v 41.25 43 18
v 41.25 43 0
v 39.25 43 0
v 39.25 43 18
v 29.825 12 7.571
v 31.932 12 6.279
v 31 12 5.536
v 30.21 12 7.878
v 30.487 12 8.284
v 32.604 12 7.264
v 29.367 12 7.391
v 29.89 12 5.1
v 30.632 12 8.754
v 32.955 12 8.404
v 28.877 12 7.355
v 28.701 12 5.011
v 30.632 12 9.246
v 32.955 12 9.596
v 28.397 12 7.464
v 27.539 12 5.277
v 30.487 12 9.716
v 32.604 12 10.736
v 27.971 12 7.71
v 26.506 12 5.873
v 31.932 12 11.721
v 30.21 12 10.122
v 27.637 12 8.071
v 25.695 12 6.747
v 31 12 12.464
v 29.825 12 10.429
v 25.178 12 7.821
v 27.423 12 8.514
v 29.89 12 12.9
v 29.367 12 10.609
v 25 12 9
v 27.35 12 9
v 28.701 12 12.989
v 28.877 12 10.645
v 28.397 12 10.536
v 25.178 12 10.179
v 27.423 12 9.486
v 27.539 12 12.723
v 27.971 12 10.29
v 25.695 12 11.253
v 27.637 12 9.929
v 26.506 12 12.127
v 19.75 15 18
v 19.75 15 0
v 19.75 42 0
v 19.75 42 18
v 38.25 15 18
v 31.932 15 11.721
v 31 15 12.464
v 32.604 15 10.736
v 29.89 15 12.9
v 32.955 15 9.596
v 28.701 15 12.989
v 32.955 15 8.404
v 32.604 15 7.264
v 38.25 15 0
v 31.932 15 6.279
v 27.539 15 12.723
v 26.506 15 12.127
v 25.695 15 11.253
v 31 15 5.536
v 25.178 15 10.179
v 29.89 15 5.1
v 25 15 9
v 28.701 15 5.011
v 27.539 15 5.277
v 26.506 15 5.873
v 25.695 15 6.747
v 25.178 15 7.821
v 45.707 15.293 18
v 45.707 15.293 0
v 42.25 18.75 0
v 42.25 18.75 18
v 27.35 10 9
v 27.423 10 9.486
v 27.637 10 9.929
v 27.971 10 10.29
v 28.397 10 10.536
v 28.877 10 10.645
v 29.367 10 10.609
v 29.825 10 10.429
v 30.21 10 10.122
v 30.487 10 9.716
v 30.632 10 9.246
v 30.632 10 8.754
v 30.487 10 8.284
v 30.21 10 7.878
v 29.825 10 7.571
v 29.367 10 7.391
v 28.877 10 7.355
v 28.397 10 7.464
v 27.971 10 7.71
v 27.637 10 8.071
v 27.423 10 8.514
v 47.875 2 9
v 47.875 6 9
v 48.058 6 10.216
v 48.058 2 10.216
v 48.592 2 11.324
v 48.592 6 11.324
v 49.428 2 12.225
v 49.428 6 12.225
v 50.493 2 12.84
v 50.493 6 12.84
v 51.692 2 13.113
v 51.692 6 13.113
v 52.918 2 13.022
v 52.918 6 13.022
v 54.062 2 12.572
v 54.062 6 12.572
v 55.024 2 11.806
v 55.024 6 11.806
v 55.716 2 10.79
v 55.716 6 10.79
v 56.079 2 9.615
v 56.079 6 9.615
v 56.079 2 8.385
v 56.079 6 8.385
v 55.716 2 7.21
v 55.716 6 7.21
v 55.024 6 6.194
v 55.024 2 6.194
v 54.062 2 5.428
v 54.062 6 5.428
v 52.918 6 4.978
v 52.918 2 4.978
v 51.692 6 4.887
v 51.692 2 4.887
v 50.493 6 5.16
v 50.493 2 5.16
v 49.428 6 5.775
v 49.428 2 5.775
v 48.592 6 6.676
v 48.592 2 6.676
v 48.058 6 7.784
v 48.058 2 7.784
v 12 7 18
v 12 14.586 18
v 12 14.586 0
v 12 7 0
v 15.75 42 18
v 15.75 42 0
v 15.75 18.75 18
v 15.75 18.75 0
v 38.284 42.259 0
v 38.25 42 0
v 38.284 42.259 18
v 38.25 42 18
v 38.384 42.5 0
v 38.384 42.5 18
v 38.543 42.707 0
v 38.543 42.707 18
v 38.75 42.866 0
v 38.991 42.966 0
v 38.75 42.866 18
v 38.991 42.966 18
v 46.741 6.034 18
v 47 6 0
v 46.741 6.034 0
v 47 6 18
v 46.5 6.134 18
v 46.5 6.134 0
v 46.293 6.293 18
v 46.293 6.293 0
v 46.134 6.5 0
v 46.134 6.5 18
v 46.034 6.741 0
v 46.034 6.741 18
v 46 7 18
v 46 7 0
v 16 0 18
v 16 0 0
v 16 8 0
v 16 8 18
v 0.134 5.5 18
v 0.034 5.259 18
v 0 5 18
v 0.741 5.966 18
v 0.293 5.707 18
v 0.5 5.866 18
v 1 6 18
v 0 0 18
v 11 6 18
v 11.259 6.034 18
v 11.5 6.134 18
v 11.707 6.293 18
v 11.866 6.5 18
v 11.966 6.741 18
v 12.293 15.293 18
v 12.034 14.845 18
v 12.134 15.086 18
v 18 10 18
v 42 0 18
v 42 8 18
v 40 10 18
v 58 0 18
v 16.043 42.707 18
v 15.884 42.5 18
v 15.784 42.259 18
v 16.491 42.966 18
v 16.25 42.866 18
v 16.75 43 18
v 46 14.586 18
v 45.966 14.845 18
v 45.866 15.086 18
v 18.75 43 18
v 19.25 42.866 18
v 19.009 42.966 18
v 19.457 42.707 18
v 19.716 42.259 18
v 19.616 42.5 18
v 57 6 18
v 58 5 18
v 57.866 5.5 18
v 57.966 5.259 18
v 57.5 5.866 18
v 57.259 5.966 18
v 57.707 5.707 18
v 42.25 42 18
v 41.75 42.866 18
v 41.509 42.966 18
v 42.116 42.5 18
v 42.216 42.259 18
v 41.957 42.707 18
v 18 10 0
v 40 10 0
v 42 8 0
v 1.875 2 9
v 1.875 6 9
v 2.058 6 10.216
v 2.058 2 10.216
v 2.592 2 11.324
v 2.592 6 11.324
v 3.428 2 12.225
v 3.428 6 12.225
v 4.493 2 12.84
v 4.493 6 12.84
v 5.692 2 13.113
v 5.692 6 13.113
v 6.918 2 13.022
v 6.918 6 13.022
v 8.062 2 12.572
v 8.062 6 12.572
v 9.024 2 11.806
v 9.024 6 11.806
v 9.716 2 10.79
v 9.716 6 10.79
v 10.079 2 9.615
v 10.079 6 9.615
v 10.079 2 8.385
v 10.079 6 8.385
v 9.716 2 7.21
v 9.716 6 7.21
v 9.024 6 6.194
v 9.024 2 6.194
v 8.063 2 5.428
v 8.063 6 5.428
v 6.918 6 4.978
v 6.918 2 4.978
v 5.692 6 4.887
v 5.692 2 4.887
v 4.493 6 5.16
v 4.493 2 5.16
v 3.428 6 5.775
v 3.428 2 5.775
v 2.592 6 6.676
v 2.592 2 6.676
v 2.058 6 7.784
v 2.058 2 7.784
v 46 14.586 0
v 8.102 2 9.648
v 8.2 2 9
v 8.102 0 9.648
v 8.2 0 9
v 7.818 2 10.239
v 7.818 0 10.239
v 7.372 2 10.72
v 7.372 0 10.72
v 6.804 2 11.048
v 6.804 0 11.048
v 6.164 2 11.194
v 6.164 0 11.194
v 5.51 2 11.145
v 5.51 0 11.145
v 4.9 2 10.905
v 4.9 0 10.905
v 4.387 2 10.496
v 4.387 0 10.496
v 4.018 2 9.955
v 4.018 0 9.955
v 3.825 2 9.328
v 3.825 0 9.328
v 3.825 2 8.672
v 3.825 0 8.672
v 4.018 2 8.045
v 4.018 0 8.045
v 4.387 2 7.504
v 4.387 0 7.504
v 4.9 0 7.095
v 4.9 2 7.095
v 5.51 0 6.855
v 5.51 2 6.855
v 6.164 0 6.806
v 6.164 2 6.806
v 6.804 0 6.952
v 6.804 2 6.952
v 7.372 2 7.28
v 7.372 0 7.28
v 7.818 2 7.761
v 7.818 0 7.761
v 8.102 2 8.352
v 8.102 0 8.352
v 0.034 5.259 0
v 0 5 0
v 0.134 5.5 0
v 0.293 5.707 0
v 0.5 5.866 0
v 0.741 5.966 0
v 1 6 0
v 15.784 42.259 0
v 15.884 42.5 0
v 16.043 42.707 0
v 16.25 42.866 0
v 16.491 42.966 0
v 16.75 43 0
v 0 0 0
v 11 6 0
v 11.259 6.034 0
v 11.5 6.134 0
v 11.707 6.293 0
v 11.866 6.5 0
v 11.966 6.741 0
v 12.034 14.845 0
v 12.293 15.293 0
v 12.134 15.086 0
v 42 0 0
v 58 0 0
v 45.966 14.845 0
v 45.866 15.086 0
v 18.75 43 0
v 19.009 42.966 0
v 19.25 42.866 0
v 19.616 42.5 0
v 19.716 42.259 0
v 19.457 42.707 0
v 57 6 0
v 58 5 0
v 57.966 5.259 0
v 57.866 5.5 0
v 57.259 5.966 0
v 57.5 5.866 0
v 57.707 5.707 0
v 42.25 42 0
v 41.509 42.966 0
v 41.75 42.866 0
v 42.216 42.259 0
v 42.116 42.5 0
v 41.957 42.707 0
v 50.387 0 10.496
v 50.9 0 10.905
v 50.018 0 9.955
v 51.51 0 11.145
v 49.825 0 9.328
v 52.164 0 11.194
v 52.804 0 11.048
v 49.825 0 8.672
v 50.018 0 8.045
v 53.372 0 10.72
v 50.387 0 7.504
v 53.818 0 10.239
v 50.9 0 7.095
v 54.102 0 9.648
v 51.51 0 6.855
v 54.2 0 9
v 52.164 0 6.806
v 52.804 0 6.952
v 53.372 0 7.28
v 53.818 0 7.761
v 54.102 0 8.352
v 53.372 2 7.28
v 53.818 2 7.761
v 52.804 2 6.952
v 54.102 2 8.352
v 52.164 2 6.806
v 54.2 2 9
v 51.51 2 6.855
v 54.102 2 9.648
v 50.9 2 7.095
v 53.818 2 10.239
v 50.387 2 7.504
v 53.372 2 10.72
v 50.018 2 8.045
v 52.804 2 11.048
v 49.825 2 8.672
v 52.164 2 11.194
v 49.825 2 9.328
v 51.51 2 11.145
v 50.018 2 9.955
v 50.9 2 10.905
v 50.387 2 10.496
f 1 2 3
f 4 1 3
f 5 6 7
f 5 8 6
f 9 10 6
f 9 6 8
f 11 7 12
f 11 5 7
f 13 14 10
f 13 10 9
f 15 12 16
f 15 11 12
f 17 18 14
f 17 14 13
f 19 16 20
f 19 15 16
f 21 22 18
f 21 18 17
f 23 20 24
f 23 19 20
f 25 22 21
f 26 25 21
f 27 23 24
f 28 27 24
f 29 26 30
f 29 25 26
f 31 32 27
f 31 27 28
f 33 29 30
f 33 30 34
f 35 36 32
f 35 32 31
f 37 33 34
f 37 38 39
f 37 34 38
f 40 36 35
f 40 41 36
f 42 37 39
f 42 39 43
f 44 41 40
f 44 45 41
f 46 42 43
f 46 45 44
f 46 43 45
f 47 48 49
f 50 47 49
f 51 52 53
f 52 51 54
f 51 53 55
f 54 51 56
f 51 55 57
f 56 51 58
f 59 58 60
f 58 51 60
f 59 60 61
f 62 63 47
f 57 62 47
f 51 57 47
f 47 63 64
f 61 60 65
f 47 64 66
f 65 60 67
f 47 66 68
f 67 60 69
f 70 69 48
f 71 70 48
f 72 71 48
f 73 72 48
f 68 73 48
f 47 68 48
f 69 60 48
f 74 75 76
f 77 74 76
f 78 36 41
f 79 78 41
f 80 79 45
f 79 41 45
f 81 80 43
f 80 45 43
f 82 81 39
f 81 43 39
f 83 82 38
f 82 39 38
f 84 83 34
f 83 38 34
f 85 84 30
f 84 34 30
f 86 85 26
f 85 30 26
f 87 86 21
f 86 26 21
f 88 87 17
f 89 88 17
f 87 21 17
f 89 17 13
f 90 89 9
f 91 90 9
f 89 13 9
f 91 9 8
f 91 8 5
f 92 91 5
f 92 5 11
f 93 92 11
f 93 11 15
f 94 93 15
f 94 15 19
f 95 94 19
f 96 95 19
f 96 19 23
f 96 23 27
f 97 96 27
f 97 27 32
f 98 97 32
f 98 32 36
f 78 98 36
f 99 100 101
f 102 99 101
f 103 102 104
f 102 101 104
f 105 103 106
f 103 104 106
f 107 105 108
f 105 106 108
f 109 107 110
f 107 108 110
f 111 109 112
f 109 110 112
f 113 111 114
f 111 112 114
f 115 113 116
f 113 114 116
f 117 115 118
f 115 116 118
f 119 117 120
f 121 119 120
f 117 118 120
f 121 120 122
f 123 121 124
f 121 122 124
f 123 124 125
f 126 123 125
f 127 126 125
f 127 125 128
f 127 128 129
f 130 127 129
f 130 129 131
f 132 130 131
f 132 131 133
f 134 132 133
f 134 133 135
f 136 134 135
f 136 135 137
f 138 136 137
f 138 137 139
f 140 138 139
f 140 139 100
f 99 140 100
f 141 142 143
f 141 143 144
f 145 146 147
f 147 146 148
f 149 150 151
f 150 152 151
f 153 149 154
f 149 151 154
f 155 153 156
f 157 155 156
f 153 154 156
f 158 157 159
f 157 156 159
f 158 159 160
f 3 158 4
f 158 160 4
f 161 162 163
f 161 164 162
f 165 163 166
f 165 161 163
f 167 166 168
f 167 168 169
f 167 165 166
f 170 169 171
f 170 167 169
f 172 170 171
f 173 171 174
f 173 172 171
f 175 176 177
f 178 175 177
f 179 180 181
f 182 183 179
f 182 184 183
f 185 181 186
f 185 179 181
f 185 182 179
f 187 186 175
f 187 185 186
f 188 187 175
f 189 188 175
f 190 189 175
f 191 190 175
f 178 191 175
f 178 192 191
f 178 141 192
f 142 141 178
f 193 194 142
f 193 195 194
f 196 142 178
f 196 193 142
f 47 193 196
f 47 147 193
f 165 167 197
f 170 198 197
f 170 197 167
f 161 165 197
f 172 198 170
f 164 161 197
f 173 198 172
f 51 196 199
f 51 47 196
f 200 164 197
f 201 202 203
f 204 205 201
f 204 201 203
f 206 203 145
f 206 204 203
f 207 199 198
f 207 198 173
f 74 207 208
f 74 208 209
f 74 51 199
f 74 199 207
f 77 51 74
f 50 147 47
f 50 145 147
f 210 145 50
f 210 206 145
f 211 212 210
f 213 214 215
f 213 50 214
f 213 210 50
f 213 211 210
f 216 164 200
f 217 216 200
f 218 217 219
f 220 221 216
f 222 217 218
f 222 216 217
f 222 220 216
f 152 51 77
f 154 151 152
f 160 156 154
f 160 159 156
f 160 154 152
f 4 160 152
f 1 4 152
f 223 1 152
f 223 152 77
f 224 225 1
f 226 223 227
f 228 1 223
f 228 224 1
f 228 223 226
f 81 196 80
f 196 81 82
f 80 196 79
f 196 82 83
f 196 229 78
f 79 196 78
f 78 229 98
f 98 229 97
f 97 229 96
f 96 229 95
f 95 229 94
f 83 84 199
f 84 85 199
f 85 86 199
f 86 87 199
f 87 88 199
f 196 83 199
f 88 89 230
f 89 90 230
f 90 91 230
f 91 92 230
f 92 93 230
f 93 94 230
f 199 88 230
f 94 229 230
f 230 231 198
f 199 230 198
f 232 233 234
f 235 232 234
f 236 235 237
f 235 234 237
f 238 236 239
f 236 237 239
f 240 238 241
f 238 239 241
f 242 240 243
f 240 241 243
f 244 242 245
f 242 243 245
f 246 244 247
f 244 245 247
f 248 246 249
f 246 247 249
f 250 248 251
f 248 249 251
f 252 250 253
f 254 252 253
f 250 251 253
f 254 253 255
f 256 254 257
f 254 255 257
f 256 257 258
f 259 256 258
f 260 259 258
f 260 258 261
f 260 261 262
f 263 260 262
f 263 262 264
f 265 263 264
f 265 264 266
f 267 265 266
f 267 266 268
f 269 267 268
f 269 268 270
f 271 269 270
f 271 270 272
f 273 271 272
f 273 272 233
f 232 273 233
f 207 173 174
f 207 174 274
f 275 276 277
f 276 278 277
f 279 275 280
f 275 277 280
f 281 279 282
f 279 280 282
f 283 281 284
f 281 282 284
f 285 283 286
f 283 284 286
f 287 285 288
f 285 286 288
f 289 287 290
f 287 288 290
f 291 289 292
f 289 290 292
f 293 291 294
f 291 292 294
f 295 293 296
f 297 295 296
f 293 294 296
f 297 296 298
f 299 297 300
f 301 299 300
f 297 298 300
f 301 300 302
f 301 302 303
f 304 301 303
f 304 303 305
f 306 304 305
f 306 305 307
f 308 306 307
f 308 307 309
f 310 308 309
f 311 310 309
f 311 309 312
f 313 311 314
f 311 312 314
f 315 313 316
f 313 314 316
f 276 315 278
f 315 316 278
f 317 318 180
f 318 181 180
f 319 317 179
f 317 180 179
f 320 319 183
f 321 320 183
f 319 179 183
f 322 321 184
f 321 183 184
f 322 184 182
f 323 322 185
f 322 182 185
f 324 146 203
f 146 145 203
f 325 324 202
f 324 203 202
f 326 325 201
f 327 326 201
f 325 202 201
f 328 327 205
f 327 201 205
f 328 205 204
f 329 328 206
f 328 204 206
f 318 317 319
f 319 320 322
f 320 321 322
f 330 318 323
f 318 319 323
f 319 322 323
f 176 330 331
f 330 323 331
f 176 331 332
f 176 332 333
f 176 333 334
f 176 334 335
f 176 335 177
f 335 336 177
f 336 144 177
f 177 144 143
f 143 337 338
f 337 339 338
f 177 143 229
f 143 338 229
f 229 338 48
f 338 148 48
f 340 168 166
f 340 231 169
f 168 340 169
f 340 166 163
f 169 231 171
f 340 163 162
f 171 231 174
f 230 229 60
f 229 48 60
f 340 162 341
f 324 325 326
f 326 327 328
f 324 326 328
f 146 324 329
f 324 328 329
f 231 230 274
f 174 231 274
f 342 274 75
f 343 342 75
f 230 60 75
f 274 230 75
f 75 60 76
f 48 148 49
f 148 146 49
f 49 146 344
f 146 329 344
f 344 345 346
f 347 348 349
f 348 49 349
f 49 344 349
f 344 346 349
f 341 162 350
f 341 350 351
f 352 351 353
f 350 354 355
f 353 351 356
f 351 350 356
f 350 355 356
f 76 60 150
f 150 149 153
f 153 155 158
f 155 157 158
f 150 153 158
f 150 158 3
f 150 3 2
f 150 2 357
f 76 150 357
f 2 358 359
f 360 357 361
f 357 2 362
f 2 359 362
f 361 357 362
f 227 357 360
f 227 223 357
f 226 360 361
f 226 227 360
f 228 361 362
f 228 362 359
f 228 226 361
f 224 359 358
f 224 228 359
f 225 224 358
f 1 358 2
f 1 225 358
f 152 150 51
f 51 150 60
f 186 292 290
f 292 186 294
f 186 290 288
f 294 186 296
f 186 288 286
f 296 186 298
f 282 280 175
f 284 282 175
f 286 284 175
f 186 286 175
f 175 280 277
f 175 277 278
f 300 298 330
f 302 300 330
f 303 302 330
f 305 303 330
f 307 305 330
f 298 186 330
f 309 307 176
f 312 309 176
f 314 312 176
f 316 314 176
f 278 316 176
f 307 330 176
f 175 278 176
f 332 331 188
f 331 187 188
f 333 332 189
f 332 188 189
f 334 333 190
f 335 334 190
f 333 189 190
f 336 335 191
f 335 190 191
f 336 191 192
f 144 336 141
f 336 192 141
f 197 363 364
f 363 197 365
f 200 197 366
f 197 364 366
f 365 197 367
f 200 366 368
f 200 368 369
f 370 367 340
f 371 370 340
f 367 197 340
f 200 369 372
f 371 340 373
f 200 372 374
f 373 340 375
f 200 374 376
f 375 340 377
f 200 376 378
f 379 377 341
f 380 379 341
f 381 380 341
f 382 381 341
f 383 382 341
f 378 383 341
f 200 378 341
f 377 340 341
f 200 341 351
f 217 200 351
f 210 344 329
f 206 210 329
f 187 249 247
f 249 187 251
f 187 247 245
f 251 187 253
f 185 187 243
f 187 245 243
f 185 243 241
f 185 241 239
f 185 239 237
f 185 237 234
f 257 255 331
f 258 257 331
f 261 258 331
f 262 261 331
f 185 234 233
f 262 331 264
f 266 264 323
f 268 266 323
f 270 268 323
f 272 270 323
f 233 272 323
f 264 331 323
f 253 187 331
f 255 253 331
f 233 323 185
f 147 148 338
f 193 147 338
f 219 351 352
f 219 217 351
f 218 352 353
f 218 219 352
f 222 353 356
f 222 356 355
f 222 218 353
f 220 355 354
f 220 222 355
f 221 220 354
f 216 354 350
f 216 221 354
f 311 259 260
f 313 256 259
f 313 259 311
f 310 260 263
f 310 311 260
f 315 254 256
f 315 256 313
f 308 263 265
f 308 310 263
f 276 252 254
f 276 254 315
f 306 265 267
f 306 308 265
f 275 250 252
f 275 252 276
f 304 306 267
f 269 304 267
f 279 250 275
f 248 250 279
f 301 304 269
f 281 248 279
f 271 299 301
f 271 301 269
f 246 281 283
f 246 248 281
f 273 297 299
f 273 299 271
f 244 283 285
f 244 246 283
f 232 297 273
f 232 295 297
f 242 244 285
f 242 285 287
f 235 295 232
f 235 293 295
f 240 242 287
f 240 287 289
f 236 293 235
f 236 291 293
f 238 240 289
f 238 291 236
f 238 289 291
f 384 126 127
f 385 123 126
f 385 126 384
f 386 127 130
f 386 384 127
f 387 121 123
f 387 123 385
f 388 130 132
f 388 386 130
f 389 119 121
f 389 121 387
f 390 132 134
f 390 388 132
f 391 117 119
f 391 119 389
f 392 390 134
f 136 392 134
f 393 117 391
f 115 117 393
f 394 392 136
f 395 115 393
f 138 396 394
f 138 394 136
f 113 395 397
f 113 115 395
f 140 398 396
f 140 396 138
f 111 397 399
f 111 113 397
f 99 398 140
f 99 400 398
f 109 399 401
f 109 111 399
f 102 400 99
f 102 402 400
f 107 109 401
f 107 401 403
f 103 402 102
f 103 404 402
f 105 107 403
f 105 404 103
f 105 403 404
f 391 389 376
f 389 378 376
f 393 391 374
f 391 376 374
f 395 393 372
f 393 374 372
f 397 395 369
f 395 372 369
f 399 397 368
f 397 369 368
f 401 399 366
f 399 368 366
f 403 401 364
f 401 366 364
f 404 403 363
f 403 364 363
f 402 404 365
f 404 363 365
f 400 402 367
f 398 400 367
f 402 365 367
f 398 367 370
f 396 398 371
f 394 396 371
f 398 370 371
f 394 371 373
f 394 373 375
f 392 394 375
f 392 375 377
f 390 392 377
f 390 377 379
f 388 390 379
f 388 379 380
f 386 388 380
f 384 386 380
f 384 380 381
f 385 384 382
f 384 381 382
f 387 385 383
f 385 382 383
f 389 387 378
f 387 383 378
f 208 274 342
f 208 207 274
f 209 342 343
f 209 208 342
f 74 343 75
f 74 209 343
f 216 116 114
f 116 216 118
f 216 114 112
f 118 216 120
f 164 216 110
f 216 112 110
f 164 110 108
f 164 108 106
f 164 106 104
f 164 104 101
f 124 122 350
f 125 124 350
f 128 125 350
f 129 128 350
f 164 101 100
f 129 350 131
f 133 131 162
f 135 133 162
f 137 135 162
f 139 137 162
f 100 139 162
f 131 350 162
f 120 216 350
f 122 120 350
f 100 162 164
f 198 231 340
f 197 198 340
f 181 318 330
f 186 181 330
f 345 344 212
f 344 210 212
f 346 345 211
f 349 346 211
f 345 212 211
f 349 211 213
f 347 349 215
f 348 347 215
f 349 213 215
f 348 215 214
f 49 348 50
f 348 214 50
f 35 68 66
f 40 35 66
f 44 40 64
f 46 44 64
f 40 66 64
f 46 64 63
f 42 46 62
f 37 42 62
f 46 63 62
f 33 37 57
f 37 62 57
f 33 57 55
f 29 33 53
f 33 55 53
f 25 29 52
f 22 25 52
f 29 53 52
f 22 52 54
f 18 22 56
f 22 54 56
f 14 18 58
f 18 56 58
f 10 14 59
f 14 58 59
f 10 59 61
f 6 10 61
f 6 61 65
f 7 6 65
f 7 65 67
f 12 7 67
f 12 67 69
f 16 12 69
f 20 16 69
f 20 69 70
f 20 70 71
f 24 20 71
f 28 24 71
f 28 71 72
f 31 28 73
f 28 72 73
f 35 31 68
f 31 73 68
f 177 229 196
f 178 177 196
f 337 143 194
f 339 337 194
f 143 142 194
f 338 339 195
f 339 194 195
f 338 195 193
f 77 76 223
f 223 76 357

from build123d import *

# Parameters (mm, degrees)
F1_DEPTH             = 18
F4_D                 = 4.4
F4_CBORE_D           = 8.25
F4_CBORE_DEPTH       = 4
F4_ON_F3_D           = 4.4
F4_ON_F3_CBORE_D     = 8.25
F4_ON_F3_CBORE_DEPTH = 4
F5_SIZE              = 2
F6_R                 = 1
F7_R                 = 1.65
F8_DEPTH             = 15.001
F9_R                 = 4
F10_DEPTH            = 3


with BuildPart() as f1:
    # F0 (on Top) → F1 (new body)
    with BuildSketch(Plane.XY):
        Polygon((0, 6), (0, 0), (16, 0), (16, 10), (42, 10), (42, 0), (58, 0), (58, 6), (46, 6), (46, 15), (42.25, 18.75), (42.25, 43), (38.25, 43), (38.25, 15), (19.75, 15), (19.75, 43), (15.75, 43), (15.75, 18.75), (12, 15), (12, 6), align=None)
    extrude(amount=F1_DEPTH)

    # F4 (through all)
    with Locations(Plane(origin=(0, 6, 0), x_dir=(-1, 0, 0), z_dir=(0, 1, 0))):
        with Locations((-52, 9)):
            CounterBoreHole(F4_D / 2, F4_CBORE_D / 2, F4_CBORE_DEPTH)

    # F4 on F3 (through all)
    with Locations(Plane(origin=(0, 6, 0), x_dir=(-1, 0, 0), z_dir=(0, 1, 0))):
        with Locations((-6, 9)):
            CounterBoreHole(F4_ON_F3_D / 2, F4_ON_F3_CBORE_D / 2, F4_ON_F3_CBORE_DEPTH)

    # F5
    f5_edges = [f1.edges().sort_by_distance(p)[0] for p in [
        (16, 10, 9),
        (42, 10, 9),
    ]]
    chamfer(f5_edges, length=F5_SIZE)

    # F6
    f6_edges = [f1.edges().sort_by_distance(p)[0] for p in [
        (46, 6, 9),
        (38.25, 43, 9),
        (19.75, 43, 9),
        (12, 6, 9),
        (0, 6, 9),
        (58, 6, 9),
        (12, 15, 9),
        (15.75, 43, 9),
        (46, 15, 9),
        (42.25, 43, 9),
    ]]
    fillet(f6_edges, radius=F6_R)

    # F7 (on face) → F8 (cut, through all)
    with BuildSketch(Plane(origin=(0, 15, 0), x_dir=(-1, 0, 0), z_dir=(0, 1, 0))):
        with Locations((-29, 9)):
            Circle(F7_R)
    extrude(amount=-F8_DEPTH, mode=Mode.SUBTRACT)

    # F9 (on face) → F10 (cut)
    with BuildSketch(Plane(origin=(0, 15, 0), x_dir=(-1, 0, 0), z_dir=(0, 1, 0))):
        with Locations((-29, 9)):
            Circle(F9_R)
    extrude(amount=-F10_DEPTH, mode=Mode.SUBTRACT)


solid = f1.part
